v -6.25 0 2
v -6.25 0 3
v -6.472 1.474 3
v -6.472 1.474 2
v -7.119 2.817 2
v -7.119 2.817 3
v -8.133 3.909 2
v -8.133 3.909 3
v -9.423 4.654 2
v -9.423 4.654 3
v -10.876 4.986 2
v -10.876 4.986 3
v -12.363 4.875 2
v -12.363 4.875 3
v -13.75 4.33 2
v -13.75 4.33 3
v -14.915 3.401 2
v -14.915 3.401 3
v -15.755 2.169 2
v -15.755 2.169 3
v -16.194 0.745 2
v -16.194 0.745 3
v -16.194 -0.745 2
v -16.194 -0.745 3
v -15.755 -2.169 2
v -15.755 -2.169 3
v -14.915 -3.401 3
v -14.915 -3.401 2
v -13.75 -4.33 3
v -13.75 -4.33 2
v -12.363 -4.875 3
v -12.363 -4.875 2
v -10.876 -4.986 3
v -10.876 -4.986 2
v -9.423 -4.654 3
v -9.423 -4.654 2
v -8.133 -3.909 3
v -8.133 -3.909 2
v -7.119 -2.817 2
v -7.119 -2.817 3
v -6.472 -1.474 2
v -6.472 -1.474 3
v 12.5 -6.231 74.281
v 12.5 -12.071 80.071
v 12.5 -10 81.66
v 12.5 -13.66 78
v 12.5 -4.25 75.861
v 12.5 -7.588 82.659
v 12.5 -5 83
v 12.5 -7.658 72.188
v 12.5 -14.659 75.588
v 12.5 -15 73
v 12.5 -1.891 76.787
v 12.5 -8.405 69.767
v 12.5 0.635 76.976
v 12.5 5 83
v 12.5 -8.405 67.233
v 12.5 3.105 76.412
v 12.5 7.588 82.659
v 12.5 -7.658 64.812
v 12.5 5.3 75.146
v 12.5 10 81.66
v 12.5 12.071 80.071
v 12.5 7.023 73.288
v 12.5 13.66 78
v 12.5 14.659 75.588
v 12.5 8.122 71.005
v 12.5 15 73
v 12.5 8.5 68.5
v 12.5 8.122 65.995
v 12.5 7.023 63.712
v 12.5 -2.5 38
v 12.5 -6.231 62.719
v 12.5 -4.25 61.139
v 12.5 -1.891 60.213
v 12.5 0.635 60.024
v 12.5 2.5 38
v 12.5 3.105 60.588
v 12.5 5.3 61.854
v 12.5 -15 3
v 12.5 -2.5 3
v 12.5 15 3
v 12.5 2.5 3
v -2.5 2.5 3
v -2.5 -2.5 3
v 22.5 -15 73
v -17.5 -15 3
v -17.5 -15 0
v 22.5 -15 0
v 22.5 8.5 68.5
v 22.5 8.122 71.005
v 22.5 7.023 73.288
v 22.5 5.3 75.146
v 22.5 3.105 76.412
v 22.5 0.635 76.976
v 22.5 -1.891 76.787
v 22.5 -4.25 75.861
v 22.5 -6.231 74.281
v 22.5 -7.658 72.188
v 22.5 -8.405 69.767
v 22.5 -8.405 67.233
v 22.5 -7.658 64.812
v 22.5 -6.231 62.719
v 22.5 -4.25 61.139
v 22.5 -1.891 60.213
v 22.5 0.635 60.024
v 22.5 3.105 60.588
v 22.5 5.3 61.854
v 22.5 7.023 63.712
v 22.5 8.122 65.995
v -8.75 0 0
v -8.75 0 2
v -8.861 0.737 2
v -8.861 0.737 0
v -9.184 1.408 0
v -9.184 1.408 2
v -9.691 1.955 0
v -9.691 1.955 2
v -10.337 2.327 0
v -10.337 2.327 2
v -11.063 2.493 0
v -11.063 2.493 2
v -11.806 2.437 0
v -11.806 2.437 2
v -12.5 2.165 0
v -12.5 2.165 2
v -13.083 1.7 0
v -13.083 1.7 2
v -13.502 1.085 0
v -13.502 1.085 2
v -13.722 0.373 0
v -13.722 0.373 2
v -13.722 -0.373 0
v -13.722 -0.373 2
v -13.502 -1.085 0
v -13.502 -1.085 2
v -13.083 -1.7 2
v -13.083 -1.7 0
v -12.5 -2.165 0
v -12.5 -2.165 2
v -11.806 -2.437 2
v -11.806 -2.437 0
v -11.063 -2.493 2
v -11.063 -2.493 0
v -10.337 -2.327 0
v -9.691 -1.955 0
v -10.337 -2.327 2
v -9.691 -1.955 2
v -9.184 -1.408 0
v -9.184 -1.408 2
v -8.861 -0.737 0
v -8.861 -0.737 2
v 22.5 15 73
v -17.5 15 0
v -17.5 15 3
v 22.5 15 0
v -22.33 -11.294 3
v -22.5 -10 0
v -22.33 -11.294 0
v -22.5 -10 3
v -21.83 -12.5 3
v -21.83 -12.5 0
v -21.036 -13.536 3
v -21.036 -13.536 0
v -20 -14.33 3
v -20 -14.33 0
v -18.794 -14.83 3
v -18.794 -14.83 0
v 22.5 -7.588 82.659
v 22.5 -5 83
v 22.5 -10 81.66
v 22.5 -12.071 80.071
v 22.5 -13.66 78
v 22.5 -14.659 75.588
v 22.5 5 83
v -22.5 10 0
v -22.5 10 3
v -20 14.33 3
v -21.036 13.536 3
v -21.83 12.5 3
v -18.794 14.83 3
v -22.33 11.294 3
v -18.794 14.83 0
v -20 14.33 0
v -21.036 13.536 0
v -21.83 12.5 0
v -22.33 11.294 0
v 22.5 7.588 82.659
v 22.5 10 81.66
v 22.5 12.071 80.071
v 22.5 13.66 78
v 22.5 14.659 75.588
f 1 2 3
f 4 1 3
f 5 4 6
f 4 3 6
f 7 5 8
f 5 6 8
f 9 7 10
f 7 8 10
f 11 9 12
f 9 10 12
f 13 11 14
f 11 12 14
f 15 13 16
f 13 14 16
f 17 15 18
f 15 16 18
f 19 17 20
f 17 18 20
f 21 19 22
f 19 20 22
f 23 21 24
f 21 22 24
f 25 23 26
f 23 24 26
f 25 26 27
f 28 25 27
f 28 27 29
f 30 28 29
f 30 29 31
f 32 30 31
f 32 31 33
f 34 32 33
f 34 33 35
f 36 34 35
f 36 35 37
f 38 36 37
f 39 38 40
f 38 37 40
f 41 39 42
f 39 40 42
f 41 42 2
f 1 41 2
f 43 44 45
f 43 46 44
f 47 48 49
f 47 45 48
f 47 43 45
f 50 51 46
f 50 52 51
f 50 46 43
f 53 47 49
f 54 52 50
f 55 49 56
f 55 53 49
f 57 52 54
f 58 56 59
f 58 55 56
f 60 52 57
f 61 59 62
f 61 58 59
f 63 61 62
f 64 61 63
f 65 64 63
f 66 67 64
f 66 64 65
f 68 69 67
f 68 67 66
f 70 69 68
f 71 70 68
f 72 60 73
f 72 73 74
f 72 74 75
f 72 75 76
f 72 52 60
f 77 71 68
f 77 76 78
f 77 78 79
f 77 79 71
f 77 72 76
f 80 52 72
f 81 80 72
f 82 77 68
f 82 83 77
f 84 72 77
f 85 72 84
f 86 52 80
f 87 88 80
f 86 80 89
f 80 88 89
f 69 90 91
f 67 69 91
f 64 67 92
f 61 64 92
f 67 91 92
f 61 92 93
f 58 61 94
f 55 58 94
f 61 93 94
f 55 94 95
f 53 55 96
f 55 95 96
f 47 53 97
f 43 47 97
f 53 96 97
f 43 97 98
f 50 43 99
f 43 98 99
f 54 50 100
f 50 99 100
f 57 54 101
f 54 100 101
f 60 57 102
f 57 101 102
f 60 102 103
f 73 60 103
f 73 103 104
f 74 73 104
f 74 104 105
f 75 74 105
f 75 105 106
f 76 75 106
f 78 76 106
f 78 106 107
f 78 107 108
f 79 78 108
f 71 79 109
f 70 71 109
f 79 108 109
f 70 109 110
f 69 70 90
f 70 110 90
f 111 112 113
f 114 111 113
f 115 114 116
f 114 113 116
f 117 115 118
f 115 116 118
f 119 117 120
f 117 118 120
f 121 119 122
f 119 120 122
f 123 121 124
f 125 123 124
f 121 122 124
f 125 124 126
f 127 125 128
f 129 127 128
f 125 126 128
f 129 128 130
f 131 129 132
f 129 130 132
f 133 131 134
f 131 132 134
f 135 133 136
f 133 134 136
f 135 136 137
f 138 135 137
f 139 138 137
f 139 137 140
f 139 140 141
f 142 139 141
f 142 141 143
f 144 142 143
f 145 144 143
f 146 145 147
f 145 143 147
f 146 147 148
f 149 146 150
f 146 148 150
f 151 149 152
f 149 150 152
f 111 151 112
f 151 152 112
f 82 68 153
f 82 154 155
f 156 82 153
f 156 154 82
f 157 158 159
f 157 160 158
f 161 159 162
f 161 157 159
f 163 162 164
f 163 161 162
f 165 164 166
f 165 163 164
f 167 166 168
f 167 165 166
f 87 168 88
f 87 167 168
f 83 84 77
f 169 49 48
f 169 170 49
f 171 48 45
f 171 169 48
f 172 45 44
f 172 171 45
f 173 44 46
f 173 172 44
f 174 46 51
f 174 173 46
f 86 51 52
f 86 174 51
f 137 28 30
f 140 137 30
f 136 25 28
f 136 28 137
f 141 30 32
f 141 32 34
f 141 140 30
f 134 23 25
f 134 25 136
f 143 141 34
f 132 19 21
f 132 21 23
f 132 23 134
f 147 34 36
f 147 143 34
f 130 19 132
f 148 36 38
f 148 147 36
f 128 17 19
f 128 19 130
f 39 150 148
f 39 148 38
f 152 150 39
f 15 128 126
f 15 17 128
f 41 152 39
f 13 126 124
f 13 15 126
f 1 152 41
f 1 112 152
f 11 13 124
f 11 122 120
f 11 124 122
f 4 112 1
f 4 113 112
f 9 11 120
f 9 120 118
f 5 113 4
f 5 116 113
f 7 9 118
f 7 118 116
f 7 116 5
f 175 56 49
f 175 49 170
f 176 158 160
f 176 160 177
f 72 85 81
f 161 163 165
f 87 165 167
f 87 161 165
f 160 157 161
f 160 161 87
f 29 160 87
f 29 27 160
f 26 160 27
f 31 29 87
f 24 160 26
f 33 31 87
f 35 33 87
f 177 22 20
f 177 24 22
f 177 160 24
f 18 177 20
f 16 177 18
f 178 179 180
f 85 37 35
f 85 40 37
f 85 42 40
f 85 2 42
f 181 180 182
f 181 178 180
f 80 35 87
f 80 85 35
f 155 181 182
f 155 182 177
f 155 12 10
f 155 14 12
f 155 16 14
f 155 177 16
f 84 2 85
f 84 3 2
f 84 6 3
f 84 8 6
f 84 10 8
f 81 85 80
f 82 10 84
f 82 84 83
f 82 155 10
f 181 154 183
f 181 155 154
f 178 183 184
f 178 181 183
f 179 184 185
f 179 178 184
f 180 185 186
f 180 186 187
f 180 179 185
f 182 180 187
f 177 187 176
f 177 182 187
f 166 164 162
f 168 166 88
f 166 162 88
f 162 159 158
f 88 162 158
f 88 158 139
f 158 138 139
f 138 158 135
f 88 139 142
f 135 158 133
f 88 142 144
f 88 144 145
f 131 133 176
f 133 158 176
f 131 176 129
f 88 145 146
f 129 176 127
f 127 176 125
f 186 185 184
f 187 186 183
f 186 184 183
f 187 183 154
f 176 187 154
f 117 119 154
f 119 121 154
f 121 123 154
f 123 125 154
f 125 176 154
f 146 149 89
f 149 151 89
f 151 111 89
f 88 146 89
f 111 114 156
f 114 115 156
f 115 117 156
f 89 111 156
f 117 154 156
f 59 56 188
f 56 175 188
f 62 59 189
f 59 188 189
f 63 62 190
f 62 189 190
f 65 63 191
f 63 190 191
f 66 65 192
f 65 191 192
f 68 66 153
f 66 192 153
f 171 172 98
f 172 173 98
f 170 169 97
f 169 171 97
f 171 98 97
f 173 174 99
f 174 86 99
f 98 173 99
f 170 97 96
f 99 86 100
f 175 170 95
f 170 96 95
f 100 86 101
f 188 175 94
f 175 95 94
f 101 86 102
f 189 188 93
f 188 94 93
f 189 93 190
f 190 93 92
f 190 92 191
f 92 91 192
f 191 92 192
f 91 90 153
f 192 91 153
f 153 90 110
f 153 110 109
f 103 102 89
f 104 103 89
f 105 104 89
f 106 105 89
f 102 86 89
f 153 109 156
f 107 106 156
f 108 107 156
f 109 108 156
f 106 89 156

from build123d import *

# Parameters (mm, degrees)
F0_W      = 45
F0_H      = 30
F1_DEPTH  = 3
F2_R      = 5
F3_DEPTH  = 1
F4_R      = 2.5
F5_DEPTH  = 2
F6_W      = 10
F6_H      = 30
F7_DEPTH  = 80
F9_DEPTH  = 2.5
F10_R     = 8.5
F11_DEPTH = 10
F12_R     = 10
F13_R     = 10
F14_R     = 5
F15_R     = 5


with BuildPart() as f1:
    # F0 (on Top) → F1 (new body)
    with BuildSketch(Plane.XY):
        Rectangle(F0_W, F0_H)
    extrude(amount=F1_DEPTH)

    # F2 (on face) → F3 (cut)
    with BuildSketch(Plane.XY.offset(3)):
        with Locations((-11.25, 0)):
            Circle(F2_R)
    extrude(amount=-F3_DEPTH, mode=Mode.SUBTRACT)

    # F4 (on face) → F5 (cut, through all)
    with BuildSketch(Plane.XY.offset(2)):
        with Locations((-11.25, 0)):
            Circle(F4_R)
    extrude(amount=-F5_DEPTH, mode=Mode.SUBTRACT)

    # F6 (on face) → F7 (join)
    with BuildSketch(Plane.XY.offset(3)):
        with Locations((17.5, 0)):
            Rectangle(F6_W, F6_H)
    extrude(amount=F7_DEPTH)

    # F8 (on Front) → F9 (join, symmetric)
    with BuildSketch(Plane.XZ):
        Polygon((12.5, 38), (-2.5, 3), (12.5, 3), align=None)
    extrude(amount=F9_DEPTH, both=True)

    # F10 (on face) → F11 (cut, through all)
    with BuildSketch(Plane.YZ.offset(22.5)):
        with Locations((0, 68.5)):
            Circle(F10_R)
    extrude(amount=-F11_DEPTH, mode=Mode.SUBTRACT)

    # F12
    f12_edges = [f1.edges().sort_by_distance(p)[0] for p in [
        (17.5, 15, 83),
    ]]
    fillet(f12_edges, radius=F12_R)

    # F13
    f13_edges = [f1.edges().sort_by_distance(p)[0] for p in [
        (17.5, -15, 83),
    ]]
    fillet(f13_edges, radius=F13_R)

    # F14
    f14_edges = [f1.edges().sort_by_distance(p)[0] for p in [
        (-22.5, 15, 1.5),
    ]]
    fillet(f14_edges, radius=F14_R)

    # F15
    f15_edges = [f1.edges().sort_by_distance(p)[0] for p in [
        (-22.5, -15, 1.5),
    ]]
    fillet(f15_edges, radius=F15_R)


solid = f1.part
